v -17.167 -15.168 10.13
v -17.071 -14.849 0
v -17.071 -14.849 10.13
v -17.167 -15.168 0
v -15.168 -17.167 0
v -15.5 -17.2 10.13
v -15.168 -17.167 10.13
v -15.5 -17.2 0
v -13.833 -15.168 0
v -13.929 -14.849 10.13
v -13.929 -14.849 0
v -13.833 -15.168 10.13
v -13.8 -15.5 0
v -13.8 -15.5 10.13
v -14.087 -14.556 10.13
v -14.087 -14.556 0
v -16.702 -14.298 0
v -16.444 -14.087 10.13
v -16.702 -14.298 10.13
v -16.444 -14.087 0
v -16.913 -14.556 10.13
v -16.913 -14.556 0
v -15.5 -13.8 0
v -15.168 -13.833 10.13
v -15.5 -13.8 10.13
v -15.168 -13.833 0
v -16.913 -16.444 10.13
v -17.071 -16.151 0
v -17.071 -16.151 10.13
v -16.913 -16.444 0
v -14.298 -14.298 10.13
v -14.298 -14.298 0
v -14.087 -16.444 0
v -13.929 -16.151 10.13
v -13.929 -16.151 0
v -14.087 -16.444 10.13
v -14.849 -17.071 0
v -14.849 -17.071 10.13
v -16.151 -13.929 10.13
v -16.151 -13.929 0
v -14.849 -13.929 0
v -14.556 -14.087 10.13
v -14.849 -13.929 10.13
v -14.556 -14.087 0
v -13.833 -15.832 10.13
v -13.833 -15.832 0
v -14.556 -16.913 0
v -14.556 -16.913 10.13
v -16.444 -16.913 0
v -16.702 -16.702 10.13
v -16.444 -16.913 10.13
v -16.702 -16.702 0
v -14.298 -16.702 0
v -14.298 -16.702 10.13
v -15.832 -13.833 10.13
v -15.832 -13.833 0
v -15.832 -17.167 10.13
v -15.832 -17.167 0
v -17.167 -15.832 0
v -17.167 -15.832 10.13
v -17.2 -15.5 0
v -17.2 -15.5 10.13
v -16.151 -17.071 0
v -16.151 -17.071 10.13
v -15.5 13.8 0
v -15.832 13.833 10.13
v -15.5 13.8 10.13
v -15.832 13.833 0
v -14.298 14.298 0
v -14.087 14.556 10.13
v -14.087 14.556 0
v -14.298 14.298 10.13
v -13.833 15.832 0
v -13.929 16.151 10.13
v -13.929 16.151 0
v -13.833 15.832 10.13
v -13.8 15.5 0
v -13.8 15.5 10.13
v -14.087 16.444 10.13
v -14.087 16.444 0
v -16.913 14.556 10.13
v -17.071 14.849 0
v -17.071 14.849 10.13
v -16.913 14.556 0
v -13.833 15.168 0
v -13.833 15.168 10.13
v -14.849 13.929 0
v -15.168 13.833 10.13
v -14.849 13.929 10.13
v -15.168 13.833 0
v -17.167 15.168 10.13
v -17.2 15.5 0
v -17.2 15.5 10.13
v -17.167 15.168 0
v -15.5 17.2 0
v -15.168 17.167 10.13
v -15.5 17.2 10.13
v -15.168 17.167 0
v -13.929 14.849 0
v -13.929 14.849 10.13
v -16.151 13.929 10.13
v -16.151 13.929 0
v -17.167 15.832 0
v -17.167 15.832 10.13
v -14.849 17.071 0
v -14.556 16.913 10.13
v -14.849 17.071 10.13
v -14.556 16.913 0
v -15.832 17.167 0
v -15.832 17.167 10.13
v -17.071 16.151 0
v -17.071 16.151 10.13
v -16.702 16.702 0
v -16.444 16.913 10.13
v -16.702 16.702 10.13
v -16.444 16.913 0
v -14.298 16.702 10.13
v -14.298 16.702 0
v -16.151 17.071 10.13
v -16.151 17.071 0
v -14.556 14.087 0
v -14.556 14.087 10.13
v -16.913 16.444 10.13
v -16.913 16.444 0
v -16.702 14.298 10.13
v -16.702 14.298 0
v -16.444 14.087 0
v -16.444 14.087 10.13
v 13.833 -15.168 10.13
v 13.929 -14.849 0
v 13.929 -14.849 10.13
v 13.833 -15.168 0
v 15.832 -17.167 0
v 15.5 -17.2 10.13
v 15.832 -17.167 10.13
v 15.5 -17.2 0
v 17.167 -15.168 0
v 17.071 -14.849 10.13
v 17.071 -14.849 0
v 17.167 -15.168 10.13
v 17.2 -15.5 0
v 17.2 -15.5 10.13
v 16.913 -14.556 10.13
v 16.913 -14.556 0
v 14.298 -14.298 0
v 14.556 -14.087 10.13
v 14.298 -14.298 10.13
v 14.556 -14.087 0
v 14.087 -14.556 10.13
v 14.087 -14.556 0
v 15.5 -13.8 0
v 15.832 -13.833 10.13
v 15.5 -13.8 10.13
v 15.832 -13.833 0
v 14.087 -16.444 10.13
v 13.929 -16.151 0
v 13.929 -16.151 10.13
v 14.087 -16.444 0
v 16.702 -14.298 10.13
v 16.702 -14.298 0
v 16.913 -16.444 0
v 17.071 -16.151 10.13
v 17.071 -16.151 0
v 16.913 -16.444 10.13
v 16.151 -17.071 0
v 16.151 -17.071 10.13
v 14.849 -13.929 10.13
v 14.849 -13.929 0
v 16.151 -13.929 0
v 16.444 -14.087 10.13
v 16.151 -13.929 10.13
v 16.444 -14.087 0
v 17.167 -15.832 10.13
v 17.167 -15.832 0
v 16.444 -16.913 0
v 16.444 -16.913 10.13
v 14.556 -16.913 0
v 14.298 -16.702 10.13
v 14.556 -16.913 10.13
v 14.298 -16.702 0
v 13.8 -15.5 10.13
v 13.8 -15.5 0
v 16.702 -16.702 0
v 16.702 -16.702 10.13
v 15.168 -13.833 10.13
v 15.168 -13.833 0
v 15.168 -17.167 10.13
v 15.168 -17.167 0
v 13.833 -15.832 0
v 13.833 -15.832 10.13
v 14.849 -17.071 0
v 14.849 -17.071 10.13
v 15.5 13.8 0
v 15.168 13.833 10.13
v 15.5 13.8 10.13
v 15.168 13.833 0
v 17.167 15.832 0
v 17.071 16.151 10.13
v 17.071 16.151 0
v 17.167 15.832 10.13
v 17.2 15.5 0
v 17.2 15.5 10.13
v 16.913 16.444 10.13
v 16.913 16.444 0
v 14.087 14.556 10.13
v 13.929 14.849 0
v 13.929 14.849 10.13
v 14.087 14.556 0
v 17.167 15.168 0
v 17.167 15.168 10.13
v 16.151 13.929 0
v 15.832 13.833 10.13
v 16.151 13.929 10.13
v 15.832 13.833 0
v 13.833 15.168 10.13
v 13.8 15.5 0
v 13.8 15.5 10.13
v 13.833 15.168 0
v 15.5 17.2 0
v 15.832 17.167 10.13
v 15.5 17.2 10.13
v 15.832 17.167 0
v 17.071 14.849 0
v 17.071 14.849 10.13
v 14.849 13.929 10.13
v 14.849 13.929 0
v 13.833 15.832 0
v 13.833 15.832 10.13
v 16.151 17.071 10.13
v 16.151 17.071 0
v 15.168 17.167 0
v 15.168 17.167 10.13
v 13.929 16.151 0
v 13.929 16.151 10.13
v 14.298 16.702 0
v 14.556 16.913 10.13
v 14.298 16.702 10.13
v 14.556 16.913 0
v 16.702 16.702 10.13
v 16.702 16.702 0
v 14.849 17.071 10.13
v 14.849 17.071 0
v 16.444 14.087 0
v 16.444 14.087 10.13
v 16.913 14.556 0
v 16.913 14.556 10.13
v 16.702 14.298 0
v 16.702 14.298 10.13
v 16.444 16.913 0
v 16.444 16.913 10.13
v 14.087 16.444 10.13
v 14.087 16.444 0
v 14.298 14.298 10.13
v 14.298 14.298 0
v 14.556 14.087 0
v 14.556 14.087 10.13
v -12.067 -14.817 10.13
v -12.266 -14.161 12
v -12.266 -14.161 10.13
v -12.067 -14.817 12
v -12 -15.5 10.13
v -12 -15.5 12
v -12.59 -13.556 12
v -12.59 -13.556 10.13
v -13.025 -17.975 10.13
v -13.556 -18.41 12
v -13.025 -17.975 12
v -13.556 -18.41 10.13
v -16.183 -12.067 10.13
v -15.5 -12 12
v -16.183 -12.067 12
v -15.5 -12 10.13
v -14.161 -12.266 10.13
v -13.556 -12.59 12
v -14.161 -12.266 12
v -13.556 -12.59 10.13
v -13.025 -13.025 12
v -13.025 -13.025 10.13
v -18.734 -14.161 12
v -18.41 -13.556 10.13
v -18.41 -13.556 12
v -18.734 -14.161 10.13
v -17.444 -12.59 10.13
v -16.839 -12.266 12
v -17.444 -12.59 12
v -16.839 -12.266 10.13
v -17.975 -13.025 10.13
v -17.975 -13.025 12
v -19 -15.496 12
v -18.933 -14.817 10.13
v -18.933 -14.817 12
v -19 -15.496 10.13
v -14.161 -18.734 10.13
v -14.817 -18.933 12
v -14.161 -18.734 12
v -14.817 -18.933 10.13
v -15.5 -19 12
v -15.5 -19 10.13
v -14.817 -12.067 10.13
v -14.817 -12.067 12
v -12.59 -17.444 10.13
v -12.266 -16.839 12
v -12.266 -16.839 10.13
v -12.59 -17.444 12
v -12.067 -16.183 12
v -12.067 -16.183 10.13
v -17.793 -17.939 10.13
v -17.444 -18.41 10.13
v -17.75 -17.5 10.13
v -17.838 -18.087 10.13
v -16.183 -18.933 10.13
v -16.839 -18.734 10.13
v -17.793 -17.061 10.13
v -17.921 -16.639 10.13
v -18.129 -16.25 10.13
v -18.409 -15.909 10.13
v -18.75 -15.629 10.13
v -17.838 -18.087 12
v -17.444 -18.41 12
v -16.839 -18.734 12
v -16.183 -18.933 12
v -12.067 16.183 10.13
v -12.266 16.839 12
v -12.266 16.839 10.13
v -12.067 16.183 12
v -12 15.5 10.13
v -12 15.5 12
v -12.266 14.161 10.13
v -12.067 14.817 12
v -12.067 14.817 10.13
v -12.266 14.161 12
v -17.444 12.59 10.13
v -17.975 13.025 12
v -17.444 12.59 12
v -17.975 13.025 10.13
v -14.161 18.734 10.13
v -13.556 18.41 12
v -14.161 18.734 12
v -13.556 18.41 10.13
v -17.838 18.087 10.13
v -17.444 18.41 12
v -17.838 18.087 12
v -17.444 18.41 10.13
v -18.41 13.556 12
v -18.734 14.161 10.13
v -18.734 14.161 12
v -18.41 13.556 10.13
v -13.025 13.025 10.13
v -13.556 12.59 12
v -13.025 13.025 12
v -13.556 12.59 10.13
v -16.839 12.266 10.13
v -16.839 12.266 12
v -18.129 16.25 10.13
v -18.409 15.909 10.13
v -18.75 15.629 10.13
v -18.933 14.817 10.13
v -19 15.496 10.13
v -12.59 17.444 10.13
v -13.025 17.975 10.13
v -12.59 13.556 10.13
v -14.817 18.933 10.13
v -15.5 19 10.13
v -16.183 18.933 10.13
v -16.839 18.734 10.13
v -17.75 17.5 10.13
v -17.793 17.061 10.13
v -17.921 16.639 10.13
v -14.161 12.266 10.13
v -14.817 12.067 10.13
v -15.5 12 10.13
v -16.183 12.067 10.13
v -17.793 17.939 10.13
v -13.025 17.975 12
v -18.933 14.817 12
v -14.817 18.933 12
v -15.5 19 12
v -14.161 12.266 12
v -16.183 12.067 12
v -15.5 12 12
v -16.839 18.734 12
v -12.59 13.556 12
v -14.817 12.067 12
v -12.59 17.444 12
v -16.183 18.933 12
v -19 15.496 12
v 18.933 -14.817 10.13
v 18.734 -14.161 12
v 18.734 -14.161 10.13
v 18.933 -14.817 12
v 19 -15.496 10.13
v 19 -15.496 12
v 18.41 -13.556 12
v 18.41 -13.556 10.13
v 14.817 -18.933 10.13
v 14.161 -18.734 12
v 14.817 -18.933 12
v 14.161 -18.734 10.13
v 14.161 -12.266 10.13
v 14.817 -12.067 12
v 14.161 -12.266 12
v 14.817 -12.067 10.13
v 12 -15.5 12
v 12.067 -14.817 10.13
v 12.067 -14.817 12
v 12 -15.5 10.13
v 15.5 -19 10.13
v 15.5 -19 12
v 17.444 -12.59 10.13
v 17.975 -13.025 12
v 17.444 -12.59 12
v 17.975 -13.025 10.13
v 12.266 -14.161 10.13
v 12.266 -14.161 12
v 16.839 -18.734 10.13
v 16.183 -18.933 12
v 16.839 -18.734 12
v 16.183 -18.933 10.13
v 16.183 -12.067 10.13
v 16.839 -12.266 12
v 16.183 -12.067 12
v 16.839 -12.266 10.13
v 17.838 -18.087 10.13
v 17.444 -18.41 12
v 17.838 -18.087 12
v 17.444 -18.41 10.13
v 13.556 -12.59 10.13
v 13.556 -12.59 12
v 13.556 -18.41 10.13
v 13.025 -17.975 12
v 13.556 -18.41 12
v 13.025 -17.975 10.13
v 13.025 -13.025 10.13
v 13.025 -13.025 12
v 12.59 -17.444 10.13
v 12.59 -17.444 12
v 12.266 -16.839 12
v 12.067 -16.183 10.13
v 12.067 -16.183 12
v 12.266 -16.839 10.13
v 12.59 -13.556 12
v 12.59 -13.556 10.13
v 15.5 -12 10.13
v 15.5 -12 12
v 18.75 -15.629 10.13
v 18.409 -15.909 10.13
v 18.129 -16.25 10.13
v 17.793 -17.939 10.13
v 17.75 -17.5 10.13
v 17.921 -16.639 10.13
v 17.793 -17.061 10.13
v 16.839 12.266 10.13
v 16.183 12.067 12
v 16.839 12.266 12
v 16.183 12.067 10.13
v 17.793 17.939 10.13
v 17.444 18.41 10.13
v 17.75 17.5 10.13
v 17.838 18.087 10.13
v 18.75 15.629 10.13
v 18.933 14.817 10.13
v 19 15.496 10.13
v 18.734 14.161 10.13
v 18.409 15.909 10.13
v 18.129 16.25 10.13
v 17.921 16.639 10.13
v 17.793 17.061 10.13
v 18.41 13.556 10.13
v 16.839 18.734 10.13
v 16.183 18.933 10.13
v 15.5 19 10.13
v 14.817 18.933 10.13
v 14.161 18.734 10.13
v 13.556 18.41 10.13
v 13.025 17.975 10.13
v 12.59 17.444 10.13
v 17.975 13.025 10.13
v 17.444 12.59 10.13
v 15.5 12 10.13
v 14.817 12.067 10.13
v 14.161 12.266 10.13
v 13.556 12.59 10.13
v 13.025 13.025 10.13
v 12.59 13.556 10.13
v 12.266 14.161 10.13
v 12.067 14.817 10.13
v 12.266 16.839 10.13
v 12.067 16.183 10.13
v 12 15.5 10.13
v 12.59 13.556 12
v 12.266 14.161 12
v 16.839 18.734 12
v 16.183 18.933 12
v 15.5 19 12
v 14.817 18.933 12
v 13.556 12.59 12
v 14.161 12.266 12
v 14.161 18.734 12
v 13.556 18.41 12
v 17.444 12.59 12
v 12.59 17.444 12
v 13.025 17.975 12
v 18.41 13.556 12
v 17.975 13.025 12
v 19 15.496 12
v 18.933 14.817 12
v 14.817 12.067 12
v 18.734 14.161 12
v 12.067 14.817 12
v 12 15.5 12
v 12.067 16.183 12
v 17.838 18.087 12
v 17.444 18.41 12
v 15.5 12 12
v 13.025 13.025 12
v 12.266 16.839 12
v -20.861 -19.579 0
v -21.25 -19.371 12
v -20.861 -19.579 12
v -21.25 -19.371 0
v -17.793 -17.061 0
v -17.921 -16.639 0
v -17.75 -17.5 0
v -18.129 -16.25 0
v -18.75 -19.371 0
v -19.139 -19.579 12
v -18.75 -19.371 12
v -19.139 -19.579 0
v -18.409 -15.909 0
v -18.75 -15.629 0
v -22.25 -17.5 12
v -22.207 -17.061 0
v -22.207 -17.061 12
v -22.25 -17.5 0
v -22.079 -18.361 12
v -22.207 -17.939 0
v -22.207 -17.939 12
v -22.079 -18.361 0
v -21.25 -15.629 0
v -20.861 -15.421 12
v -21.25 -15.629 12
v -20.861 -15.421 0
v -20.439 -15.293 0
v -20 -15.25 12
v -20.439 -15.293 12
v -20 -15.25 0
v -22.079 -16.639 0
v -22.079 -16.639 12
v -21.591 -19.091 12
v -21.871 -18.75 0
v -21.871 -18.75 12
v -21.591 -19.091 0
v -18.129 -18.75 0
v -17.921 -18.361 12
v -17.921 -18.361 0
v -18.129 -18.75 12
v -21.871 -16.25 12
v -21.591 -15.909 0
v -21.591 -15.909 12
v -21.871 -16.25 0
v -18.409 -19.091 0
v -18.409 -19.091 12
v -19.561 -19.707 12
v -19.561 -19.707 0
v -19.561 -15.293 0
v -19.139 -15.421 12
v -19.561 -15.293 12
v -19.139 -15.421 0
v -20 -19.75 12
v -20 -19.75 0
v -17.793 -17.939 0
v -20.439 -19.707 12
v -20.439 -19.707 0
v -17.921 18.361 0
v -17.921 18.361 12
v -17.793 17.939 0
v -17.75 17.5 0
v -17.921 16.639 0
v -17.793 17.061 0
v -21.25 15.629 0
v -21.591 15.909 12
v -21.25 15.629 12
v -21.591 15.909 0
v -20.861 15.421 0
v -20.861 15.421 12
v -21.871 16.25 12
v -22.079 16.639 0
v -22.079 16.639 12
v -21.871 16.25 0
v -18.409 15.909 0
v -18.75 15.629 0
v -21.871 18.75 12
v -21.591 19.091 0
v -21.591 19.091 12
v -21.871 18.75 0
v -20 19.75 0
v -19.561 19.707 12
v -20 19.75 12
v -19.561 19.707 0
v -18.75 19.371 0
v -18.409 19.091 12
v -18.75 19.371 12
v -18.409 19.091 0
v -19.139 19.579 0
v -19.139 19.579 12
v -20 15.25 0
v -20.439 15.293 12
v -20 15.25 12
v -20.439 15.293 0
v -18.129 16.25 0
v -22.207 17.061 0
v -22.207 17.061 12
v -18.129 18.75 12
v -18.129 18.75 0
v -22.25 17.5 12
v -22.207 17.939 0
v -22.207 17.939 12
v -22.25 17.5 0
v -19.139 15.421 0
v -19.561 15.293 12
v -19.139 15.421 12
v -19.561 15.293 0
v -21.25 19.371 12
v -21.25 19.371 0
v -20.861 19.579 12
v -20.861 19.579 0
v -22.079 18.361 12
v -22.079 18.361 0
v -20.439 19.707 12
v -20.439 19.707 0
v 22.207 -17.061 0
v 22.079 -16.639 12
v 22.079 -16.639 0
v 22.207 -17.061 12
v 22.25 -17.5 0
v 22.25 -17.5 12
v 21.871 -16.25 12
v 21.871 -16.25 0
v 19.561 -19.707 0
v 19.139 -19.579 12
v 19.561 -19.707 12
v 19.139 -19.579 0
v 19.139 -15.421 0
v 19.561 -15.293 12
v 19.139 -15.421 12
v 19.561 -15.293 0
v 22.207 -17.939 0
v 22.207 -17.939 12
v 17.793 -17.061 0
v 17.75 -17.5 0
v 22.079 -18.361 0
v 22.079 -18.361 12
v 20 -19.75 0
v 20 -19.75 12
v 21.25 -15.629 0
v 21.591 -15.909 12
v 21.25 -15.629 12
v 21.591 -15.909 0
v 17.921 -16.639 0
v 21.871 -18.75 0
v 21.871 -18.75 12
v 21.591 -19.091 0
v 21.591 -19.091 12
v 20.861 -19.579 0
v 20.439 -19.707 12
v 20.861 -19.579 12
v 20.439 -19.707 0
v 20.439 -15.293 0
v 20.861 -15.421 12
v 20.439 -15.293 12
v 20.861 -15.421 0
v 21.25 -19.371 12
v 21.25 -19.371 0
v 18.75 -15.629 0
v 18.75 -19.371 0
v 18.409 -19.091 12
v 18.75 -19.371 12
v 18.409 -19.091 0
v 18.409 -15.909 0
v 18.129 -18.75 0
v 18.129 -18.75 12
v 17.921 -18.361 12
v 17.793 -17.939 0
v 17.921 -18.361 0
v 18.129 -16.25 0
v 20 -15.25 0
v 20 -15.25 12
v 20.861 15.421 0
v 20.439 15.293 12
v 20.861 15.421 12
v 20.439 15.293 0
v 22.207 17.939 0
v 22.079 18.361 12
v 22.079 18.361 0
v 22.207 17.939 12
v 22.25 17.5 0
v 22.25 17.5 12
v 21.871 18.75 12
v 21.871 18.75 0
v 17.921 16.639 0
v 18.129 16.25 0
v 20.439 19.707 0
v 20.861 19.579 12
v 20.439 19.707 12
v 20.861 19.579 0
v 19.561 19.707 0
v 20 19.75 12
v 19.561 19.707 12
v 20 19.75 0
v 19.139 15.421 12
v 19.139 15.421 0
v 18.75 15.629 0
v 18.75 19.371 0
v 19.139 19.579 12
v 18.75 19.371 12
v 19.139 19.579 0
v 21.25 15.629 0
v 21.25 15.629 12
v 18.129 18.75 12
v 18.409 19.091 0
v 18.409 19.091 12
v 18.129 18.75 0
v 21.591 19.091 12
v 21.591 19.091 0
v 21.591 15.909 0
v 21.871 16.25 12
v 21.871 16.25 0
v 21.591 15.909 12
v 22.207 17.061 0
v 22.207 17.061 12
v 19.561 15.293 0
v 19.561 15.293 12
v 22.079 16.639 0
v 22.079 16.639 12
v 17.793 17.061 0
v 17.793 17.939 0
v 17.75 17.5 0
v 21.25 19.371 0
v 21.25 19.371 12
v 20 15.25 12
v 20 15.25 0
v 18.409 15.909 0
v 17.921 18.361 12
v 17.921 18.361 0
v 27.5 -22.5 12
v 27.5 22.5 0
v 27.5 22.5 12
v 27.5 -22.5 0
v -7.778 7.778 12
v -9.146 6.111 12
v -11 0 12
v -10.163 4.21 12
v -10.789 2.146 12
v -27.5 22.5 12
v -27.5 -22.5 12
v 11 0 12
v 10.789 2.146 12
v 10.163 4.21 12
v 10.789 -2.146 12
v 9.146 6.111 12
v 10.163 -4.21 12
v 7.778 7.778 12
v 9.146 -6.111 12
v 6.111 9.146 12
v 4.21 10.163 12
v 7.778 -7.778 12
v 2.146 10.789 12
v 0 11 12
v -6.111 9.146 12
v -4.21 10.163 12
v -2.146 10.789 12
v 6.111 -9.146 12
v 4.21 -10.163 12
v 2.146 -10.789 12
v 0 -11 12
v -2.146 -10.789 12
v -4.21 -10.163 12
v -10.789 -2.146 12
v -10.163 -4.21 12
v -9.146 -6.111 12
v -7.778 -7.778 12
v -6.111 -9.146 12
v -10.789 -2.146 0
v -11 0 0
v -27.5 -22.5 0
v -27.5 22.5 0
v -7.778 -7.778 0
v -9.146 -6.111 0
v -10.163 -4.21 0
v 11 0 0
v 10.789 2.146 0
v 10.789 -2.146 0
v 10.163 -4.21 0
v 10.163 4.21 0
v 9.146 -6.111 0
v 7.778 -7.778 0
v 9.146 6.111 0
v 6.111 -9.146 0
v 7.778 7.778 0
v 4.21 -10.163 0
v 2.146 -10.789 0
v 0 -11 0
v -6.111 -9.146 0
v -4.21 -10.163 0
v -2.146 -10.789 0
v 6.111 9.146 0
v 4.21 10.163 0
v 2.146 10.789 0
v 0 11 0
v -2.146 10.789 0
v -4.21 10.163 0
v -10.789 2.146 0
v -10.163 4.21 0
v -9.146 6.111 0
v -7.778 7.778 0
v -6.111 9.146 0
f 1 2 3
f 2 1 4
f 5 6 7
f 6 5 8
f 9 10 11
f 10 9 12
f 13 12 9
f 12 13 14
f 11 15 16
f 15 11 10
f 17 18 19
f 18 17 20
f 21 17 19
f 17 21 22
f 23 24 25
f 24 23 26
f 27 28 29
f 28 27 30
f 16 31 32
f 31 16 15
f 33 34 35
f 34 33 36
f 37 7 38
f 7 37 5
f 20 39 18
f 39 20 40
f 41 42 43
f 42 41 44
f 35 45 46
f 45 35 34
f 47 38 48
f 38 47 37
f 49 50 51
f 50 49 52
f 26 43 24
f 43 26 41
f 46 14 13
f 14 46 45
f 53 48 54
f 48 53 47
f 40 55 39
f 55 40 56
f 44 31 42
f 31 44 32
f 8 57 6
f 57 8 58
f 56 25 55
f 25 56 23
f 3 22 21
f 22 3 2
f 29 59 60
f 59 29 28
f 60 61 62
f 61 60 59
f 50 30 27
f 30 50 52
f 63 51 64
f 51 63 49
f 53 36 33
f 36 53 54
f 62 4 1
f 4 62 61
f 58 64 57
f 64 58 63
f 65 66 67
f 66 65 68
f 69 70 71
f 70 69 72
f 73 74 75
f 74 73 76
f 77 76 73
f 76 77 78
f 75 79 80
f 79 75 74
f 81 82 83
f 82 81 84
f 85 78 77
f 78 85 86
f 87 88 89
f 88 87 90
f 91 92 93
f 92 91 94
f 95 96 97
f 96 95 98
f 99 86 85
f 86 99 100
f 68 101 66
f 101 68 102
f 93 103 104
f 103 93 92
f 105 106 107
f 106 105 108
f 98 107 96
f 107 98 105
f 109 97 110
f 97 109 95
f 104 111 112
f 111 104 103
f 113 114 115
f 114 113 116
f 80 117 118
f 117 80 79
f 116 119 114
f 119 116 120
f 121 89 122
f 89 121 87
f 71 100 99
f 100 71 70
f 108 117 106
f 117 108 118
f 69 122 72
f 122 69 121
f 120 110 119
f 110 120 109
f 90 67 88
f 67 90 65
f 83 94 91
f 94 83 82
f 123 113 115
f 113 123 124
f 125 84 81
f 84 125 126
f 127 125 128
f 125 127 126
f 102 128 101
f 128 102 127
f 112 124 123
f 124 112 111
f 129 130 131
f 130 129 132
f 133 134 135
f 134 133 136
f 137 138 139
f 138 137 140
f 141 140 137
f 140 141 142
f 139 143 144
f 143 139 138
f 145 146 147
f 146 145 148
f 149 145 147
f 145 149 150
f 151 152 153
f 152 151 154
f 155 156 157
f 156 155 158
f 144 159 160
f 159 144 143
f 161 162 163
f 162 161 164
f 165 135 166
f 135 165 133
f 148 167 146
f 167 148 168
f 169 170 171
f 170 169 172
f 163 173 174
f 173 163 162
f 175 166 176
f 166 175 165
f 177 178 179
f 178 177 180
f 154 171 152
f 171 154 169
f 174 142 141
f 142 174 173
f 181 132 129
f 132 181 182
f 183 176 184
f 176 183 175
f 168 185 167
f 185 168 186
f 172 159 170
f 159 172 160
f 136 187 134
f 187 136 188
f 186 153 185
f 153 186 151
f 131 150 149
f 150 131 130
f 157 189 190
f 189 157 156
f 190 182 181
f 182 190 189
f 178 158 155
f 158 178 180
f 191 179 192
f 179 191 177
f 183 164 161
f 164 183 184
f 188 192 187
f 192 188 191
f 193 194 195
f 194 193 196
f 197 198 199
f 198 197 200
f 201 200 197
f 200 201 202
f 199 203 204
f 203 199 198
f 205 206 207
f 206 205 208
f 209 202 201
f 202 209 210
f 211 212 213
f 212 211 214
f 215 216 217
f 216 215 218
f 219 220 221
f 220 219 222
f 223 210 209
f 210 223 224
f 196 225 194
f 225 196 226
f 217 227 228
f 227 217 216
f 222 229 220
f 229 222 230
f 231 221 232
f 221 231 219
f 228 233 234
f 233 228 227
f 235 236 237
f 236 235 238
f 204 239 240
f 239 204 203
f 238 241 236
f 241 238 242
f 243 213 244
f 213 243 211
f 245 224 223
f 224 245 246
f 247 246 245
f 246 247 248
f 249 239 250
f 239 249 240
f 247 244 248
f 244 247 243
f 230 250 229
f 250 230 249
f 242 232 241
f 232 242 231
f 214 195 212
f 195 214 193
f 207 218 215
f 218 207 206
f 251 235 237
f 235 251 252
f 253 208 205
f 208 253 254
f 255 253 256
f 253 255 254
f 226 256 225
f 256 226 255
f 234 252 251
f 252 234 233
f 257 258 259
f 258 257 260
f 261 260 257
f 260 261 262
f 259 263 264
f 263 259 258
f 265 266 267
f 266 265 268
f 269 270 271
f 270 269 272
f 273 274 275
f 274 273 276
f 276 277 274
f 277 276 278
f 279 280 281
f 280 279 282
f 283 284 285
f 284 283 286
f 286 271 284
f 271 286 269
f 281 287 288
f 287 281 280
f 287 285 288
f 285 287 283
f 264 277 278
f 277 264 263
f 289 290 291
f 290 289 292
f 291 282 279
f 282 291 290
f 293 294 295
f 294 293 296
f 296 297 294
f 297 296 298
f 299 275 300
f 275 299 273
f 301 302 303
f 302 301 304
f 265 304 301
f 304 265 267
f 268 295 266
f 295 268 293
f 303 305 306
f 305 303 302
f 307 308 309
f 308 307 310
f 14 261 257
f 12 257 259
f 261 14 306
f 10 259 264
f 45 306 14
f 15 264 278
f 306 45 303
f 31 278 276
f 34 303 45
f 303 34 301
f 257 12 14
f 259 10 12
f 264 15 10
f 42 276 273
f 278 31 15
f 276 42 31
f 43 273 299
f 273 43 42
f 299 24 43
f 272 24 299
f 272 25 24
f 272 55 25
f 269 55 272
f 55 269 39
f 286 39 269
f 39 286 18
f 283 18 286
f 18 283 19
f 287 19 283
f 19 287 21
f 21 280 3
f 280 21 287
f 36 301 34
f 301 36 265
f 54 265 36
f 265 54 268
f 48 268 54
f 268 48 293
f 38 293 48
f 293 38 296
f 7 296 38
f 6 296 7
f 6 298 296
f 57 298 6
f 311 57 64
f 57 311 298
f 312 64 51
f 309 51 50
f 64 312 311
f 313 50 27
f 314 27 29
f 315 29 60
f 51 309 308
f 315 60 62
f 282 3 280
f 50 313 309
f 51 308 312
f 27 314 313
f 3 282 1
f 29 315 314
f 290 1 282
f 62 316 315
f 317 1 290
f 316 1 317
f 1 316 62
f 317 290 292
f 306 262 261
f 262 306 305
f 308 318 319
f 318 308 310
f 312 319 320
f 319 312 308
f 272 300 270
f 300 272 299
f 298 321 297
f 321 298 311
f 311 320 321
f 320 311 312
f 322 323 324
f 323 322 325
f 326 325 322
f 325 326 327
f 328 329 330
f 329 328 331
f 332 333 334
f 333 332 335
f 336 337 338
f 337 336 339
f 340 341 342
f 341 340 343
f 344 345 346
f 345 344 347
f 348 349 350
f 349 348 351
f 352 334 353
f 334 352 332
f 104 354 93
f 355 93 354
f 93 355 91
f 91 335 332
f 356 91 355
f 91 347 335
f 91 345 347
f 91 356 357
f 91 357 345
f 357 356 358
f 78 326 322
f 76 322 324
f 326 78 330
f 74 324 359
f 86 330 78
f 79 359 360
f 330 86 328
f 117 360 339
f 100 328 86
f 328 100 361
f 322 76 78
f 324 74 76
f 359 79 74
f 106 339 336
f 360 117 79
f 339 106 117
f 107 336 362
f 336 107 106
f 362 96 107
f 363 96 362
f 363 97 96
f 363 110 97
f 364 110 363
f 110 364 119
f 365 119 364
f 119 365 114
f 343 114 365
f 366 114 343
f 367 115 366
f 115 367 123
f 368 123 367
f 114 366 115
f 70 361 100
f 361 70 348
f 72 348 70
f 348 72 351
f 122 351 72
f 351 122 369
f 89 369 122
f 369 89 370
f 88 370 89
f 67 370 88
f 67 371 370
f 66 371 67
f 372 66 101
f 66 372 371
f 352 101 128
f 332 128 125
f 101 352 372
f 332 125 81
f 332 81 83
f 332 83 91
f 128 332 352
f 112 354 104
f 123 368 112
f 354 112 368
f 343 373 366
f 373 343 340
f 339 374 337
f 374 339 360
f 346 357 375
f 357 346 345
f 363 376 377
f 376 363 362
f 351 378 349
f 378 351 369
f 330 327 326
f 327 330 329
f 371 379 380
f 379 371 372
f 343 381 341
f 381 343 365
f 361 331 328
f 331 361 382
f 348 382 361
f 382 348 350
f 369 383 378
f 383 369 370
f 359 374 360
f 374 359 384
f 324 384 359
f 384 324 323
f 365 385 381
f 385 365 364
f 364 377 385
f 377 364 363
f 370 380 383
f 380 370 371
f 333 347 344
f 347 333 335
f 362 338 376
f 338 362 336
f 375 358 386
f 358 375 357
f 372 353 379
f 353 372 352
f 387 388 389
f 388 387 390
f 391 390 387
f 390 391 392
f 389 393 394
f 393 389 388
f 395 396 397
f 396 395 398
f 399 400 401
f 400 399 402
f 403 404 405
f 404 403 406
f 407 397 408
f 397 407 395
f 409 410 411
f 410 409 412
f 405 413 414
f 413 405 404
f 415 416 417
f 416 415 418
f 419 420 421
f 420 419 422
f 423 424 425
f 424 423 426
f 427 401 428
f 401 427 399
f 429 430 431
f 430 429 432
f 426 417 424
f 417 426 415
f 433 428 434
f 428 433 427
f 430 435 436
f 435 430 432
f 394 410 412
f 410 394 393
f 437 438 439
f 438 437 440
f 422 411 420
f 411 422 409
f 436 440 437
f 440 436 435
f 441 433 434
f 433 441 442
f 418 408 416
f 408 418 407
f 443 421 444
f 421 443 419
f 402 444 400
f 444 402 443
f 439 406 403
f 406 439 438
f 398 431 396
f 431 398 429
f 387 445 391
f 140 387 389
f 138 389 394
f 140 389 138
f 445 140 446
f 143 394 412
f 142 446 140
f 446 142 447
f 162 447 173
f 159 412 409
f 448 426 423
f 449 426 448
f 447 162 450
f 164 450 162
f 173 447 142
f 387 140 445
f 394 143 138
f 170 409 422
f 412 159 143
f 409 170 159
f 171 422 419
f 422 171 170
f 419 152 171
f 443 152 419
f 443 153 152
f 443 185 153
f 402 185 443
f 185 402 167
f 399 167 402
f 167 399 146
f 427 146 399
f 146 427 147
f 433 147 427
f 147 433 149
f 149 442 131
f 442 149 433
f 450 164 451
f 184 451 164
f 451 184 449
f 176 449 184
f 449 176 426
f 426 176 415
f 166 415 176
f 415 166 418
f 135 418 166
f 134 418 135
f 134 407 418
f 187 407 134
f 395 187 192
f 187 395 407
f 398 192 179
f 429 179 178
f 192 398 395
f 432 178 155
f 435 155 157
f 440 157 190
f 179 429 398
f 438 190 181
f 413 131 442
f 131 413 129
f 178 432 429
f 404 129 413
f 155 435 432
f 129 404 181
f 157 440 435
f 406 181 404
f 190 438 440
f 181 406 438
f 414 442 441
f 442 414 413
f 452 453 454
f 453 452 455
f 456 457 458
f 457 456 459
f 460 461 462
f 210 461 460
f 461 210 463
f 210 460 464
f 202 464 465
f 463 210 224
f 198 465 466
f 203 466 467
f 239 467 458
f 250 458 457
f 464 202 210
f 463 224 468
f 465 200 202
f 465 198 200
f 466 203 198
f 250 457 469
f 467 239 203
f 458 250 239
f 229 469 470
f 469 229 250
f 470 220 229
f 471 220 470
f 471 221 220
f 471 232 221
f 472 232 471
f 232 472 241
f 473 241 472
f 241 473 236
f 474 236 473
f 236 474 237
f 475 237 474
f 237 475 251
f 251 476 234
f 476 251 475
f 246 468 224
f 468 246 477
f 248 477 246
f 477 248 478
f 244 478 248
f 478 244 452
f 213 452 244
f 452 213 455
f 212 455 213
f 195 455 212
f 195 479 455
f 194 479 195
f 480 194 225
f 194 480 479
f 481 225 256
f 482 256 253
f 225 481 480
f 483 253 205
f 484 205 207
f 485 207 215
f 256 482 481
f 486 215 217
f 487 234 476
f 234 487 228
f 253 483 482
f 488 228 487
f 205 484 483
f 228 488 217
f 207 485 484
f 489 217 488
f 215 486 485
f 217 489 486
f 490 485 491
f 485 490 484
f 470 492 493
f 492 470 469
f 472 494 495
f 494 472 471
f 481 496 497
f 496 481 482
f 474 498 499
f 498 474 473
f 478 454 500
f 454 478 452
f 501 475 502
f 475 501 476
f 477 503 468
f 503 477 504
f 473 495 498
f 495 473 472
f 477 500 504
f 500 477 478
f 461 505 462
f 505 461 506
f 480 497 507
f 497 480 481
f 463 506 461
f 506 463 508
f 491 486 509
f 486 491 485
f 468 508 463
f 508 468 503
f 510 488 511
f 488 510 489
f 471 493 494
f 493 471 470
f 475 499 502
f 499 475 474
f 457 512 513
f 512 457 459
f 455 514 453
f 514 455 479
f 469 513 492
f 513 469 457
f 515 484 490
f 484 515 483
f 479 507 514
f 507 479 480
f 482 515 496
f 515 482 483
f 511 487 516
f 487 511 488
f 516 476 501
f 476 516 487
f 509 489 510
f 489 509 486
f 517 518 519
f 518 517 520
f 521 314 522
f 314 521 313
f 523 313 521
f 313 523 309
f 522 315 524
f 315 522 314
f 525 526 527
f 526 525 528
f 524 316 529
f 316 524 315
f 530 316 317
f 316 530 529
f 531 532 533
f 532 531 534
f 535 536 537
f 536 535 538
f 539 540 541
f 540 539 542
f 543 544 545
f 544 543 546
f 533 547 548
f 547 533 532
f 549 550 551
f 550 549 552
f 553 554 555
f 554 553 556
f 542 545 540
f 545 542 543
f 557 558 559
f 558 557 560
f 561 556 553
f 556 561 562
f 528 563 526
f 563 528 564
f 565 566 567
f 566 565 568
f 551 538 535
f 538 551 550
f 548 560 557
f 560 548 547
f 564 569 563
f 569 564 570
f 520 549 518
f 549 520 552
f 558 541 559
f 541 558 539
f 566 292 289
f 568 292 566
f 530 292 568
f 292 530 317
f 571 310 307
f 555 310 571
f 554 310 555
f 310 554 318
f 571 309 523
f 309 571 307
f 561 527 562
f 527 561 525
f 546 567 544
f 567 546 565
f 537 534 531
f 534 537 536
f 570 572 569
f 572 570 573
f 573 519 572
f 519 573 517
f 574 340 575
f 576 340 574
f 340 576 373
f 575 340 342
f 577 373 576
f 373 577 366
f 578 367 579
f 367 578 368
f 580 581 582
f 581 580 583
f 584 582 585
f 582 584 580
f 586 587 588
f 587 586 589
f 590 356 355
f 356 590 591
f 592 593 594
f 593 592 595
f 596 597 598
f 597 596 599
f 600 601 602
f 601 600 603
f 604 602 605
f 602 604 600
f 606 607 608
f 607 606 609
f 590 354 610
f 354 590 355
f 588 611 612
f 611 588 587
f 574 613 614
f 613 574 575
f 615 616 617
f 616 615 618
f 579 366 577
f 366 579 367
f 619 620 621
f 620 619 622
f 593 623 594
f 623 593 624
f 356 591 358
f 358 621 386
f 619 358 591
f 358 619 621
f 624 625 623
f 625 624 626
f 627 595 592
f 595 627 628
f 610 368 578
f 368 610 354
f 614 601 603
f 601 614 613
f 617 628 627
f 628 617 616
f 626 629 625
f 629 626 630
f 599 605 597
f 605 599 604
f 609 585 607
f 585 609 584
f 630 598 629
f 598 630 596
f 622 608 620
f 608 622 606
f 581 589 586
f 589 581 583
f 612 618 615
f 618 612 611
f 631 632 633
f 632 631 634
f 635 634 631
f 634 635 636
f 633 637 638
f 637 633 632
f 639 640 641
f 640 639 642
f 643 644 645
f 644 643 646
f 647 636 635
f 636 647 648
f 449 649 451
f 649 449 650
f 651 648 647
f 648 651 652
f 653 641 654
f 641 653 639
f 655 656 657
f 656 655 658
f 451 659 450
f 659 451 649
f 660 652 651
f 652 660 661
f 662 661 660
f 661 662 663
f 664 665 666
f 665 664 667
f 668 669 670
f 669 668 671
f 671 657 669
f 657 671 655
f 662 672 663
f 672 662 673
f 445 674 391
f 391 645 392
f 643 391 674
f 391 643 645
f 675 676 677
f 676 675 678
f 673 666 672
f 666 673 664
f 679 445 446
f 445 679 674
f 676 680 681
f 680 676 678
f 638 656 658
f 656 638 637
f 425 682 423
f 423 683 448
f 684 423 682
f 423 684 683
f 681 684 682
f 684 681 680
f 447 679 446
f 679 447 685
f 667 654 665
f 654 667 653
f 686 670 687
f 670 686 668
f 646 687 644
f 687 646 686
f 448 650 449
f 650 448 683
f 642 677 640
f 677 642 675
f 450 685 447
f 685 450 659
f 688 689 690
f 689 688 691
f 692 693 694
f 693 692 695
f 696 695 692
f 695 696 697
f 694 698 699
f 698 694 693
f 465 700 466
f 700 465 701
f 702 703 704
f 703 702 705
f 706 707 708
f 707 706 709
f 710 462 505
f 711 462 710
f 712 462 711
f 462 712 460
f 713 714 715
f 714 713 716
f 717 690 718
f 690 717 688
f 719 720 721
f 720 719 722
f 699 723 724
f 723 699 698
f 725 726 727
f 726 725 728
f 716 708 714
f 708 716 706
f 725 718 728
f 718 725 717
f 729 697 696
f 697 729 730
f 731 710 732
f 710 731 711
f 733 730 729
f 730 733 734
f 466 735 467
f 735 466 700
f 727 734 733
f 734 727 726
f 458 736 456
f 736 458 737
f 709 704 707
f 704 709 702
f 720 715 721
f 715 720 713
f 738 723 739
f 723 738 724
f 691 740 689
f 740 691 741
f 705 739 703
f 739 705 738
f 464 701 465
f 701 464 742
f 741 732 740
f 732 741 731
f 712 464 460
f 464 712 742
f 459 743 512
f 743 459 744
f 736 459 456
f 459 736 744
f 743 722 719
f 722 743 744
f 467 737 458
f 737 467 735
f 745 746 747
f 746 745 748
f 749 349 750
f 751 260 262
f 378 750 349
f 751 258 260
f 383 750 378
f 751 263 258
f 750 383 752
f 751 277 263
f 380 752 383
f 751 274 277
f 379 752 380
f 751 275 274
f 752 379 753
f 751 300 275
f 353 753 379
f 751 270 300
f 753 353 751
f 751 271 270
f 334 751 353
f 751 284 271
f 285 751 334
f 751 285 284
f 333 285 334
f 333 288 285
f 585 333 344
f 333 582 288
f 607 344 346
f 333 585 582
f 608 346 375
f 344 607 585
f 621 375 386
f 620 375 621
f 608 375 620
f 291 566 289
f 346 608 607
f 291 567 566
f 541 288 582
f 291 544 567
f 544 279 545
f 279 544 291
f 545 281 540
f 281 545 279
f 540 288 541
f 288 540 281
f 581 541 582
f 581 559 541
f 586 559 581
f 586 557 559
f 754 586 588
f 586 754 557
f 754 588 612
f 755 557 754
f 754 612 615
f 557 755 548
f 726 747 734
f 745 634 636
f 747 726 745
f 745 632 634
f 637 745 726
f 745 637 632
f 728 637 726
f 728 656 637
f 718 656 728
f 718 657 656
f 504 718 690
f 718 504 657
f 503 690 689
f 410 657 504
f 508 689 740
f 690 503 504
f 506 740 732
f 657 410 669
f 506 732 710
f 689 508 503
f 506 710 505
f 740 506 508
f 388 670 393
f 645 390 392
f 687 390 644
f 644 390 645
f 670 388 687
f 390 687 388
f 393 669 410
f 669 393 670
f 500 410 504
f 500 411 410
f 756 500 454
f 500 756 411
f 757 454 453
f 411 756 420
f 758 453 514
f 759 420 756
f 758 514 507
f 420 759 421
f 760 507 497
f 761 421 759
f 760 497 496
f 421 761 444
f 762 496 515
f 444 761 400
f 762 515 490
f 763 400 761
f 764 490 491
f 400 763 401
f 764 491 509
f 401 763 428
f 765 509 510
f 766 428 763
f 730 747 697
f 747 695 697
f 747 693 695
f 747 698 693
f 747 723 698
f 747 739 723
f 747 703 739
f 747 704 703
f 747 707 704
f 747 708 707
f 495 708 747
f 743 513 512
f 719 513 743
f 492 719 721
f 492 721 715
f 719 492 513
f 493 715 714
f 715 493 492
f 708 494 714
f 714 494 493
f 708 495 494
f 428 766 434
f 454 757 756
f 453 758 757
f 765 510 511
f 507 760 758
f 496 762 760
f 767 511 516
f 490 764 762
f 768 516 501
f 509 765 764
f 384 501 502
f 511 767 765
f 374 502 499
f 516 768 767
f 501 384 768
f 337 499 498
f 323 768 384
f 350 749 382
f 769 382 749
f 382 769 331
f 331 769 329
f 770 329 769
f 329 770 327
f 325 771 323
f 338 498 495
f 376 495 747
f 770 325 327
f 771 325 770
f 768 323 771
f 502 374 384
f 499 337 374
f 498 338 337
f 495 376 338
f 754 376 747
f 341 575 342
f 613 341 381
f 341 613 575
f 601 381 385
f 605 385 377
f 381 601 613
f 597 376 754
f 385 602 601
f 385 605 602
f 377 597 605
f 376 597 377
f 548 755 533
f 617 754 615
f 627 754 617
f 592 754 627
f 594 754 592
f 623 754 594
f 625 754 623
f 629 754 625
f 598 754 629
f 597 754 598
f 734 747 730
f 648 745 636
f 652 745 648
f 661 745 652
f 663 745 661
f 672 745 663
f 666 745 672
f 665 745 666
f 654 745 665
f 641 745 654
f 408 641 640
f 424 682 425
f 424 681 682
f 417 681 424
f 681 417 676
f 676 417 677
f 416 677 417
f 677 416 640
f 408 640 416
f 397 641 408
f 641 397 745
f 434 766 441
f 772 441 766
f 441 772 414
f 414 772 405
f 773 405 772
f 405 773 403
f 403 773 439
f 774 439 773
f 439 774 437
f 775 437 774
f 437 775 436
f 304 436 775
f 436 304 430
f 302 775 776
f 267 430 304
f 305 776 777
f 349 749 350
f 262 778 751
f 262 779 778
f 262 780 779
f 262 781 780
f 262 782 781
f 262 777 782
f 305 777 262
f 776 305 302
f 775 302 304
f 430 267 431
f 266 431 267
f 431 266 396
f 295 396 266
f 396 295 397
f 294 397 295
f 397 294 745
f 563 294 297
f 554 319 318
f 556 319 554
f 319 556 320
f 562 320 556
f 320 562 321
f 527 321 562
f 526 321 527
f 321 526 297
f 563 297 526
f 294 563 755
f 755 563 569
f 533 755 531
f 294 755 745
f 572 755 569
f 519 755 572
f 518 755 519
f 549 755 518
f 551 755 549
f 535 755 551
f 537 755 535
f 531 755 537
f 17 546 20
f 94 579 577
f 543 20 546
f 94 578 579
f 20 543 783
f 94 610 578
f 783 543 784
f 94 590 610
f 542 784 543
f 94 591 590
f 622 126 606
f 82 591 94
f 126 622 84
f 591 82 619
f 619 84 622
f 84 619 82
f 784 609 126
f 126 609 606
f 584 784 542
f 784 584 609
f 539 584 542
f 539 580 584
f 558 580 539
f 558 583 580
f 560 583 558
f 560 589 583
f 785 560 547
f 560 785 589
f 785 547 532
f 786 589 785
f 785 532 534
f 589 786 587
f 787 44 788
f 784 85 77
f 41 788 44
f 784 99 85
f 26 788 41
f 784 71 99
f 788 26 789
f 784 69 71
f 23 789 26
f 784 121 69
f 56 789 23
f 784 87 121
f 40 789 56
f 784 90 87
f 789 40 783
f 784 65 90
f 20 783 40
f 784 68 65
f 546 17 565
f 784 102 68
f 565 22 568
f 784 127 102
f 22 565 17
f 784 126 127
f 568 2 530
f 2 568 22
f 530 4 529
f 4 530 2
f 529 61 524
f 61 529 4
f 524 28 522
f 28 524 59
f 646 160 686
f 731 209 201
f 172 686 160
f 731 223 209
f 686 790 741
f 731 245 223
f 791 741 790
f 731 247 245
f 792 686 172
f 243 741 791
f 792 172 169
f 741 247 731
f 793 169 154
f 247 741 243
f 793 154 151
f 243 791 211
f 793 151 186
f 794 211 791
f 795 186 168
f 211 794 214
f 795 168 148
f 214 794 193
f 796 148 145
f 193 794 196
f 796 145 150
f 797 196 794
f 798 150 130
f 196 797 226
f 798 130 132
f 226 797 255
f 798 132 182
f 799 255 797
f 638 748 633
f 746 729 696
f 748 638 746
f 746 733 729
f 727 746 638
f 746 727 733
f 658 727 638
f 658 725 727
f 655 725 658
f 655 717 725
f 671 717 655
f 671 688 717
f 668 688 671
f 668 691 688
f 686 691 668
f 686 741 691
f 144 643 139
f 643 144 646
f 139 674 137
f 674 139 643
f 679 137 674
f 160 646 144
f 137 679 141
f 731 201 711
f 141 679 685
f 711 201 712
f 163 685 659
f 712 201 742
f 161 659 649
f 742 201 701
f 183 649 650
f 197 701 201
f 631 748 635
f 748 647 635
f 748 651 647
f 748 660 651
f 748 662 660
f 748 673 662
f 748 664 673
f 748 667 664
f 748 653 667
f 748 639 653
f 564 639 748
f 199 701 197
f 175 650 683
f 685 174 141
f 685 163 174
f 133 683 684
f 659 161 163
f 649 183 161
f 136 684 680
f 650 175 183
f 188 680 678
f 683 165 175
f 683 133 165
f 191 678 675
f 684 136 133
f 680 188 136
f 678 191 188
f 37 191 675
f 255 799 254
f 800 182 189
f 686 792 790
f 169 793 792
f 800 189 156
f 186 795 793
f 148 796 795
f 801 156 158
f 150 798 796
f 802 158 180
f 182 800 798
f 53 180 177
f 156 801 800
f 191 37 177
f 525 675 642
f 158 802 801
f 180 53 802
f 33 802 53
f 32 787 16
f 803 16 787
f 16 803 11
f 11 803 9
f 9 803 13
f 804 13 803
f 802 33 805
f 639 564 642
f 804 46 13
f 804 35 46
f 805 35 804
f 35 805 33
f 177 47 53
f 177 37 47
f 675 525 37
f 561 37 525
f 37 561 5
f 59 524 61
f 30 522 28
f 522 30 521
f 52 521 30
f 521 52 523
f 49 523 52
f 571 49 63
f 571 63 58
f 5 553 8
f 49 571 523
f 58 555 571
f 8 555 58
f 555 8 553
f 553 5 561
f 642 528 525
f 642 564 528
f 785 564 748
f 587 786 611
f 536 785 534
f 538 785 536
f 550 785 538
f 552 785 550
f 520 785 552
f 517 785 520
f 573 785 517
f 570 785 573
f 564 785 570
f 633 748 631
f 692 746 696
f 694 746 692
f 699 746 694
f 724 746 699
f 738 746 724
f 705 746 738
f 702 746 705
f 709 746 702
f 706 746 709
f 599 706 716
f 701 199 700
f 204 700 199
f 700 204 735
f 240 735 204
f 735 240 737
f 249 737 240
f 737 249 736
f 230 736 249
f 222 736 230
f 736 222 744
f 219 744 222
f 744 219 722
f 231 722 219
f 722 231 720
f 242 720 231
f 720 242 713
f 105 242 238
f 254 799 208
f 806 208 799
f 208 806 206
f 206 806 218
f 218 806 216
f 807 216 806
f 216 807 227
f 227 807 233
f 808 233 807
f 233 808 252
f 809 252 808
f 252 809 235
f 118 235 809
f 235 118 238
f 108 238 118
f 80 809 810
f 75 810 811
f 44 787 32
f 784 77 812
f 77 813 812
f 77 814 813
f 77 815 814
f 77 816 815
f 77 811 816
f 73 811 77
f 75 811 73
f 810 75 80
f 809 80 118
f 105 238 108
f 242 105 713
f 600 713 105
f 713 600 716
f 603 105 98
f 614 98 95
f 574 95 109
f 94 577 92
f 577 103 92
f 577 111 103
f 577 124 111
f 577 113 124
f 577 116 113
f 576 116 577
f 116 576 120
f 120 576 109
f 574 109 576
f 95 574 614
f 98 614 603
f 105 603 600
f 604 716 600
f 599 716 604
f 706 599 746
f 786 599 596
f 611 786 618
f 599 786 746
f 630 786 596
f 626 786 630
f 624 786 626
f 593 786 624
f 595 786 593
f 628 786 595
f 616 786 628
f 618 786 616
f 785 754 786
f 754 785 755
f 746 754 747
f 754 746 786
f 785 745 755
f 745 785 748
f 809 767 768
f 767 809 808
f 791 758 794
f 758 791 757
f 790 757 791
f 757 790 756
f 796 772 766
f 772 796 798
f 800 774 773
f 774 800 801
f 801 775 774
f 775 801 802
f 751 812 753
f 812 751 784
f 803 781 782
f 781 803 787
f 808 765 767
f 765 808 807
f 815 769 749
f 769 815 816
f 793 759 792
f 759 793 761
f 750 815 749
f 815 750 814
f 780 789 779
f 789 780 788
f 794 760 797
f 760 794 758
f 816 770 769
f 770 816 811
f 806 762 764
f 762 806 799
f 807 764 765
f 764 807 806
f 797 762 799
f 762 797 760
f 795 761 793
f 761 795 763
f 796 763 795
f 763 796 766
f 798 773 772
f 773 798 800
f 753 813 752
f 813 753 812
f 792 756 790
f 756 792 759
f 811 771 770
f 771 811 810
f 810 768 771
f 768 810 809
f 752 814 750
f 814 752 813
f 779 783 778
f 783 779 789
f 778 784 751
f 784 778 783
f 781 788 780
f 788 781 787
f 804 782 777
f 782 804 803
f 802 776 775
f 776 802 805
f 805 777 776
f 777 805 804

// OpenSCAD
$fn = 32;

// ----------------------------------------------------------------------
// Motor mount plate: NEMA17, 55 x 45 x 12 mm
// ----------------------------------------------------------------------

// --- parameters (mm) ---
base_x = 55;              // plate length, X
base_y = 45;              // plate width, Y
thick = 12;               // plate thickness
bolt_pitch = 31;          // NEMA17 bolt spacing
motor_d = 3.4;            // NEMA17 screw clearance
boss_hole = 22;           // pilot boss bore
cb_d = 7;                 // counterbore seat
cb_h = 1.87;              // counterbore depth
second_d = 4.5;           // second fastener hole

module plate() {
  translate([-base_x / 2, -base_y / 2, 0]) cube([base_x, base_y, thick]);
}

module motor_holes() {
  for (sx = [-1, 1]) for (sy = [-1, 1])
    translate([sx * bolt_pitch / 2, sy * bolt_pitch / 2, -1])
      cylinder(h = thick + 2, d = motor_d);
}
module motor_counterbores() {
  for (sx = [-1, 1]) for (sy = [-1, 1])
    translate([sx * bolt_pitch / 2, sy * bolt_pitch / 2, thick - cb_h])
      cylinder(h = cb_h + 0.6, d = cb_d);
}

difference() {
  union() {
    plate();
  }
  motor_holes();
  translate([0, 0, -1]) cylinder(h = thick + 2, d = boss_hole);
  motor_counterbores();
  for (sx = [-1, 1]) for (sy = [-1, 1])
    translate([sx * 20, sy * 17.5, -1]) cylinder(h = thick + 2, d = second_d);
}
